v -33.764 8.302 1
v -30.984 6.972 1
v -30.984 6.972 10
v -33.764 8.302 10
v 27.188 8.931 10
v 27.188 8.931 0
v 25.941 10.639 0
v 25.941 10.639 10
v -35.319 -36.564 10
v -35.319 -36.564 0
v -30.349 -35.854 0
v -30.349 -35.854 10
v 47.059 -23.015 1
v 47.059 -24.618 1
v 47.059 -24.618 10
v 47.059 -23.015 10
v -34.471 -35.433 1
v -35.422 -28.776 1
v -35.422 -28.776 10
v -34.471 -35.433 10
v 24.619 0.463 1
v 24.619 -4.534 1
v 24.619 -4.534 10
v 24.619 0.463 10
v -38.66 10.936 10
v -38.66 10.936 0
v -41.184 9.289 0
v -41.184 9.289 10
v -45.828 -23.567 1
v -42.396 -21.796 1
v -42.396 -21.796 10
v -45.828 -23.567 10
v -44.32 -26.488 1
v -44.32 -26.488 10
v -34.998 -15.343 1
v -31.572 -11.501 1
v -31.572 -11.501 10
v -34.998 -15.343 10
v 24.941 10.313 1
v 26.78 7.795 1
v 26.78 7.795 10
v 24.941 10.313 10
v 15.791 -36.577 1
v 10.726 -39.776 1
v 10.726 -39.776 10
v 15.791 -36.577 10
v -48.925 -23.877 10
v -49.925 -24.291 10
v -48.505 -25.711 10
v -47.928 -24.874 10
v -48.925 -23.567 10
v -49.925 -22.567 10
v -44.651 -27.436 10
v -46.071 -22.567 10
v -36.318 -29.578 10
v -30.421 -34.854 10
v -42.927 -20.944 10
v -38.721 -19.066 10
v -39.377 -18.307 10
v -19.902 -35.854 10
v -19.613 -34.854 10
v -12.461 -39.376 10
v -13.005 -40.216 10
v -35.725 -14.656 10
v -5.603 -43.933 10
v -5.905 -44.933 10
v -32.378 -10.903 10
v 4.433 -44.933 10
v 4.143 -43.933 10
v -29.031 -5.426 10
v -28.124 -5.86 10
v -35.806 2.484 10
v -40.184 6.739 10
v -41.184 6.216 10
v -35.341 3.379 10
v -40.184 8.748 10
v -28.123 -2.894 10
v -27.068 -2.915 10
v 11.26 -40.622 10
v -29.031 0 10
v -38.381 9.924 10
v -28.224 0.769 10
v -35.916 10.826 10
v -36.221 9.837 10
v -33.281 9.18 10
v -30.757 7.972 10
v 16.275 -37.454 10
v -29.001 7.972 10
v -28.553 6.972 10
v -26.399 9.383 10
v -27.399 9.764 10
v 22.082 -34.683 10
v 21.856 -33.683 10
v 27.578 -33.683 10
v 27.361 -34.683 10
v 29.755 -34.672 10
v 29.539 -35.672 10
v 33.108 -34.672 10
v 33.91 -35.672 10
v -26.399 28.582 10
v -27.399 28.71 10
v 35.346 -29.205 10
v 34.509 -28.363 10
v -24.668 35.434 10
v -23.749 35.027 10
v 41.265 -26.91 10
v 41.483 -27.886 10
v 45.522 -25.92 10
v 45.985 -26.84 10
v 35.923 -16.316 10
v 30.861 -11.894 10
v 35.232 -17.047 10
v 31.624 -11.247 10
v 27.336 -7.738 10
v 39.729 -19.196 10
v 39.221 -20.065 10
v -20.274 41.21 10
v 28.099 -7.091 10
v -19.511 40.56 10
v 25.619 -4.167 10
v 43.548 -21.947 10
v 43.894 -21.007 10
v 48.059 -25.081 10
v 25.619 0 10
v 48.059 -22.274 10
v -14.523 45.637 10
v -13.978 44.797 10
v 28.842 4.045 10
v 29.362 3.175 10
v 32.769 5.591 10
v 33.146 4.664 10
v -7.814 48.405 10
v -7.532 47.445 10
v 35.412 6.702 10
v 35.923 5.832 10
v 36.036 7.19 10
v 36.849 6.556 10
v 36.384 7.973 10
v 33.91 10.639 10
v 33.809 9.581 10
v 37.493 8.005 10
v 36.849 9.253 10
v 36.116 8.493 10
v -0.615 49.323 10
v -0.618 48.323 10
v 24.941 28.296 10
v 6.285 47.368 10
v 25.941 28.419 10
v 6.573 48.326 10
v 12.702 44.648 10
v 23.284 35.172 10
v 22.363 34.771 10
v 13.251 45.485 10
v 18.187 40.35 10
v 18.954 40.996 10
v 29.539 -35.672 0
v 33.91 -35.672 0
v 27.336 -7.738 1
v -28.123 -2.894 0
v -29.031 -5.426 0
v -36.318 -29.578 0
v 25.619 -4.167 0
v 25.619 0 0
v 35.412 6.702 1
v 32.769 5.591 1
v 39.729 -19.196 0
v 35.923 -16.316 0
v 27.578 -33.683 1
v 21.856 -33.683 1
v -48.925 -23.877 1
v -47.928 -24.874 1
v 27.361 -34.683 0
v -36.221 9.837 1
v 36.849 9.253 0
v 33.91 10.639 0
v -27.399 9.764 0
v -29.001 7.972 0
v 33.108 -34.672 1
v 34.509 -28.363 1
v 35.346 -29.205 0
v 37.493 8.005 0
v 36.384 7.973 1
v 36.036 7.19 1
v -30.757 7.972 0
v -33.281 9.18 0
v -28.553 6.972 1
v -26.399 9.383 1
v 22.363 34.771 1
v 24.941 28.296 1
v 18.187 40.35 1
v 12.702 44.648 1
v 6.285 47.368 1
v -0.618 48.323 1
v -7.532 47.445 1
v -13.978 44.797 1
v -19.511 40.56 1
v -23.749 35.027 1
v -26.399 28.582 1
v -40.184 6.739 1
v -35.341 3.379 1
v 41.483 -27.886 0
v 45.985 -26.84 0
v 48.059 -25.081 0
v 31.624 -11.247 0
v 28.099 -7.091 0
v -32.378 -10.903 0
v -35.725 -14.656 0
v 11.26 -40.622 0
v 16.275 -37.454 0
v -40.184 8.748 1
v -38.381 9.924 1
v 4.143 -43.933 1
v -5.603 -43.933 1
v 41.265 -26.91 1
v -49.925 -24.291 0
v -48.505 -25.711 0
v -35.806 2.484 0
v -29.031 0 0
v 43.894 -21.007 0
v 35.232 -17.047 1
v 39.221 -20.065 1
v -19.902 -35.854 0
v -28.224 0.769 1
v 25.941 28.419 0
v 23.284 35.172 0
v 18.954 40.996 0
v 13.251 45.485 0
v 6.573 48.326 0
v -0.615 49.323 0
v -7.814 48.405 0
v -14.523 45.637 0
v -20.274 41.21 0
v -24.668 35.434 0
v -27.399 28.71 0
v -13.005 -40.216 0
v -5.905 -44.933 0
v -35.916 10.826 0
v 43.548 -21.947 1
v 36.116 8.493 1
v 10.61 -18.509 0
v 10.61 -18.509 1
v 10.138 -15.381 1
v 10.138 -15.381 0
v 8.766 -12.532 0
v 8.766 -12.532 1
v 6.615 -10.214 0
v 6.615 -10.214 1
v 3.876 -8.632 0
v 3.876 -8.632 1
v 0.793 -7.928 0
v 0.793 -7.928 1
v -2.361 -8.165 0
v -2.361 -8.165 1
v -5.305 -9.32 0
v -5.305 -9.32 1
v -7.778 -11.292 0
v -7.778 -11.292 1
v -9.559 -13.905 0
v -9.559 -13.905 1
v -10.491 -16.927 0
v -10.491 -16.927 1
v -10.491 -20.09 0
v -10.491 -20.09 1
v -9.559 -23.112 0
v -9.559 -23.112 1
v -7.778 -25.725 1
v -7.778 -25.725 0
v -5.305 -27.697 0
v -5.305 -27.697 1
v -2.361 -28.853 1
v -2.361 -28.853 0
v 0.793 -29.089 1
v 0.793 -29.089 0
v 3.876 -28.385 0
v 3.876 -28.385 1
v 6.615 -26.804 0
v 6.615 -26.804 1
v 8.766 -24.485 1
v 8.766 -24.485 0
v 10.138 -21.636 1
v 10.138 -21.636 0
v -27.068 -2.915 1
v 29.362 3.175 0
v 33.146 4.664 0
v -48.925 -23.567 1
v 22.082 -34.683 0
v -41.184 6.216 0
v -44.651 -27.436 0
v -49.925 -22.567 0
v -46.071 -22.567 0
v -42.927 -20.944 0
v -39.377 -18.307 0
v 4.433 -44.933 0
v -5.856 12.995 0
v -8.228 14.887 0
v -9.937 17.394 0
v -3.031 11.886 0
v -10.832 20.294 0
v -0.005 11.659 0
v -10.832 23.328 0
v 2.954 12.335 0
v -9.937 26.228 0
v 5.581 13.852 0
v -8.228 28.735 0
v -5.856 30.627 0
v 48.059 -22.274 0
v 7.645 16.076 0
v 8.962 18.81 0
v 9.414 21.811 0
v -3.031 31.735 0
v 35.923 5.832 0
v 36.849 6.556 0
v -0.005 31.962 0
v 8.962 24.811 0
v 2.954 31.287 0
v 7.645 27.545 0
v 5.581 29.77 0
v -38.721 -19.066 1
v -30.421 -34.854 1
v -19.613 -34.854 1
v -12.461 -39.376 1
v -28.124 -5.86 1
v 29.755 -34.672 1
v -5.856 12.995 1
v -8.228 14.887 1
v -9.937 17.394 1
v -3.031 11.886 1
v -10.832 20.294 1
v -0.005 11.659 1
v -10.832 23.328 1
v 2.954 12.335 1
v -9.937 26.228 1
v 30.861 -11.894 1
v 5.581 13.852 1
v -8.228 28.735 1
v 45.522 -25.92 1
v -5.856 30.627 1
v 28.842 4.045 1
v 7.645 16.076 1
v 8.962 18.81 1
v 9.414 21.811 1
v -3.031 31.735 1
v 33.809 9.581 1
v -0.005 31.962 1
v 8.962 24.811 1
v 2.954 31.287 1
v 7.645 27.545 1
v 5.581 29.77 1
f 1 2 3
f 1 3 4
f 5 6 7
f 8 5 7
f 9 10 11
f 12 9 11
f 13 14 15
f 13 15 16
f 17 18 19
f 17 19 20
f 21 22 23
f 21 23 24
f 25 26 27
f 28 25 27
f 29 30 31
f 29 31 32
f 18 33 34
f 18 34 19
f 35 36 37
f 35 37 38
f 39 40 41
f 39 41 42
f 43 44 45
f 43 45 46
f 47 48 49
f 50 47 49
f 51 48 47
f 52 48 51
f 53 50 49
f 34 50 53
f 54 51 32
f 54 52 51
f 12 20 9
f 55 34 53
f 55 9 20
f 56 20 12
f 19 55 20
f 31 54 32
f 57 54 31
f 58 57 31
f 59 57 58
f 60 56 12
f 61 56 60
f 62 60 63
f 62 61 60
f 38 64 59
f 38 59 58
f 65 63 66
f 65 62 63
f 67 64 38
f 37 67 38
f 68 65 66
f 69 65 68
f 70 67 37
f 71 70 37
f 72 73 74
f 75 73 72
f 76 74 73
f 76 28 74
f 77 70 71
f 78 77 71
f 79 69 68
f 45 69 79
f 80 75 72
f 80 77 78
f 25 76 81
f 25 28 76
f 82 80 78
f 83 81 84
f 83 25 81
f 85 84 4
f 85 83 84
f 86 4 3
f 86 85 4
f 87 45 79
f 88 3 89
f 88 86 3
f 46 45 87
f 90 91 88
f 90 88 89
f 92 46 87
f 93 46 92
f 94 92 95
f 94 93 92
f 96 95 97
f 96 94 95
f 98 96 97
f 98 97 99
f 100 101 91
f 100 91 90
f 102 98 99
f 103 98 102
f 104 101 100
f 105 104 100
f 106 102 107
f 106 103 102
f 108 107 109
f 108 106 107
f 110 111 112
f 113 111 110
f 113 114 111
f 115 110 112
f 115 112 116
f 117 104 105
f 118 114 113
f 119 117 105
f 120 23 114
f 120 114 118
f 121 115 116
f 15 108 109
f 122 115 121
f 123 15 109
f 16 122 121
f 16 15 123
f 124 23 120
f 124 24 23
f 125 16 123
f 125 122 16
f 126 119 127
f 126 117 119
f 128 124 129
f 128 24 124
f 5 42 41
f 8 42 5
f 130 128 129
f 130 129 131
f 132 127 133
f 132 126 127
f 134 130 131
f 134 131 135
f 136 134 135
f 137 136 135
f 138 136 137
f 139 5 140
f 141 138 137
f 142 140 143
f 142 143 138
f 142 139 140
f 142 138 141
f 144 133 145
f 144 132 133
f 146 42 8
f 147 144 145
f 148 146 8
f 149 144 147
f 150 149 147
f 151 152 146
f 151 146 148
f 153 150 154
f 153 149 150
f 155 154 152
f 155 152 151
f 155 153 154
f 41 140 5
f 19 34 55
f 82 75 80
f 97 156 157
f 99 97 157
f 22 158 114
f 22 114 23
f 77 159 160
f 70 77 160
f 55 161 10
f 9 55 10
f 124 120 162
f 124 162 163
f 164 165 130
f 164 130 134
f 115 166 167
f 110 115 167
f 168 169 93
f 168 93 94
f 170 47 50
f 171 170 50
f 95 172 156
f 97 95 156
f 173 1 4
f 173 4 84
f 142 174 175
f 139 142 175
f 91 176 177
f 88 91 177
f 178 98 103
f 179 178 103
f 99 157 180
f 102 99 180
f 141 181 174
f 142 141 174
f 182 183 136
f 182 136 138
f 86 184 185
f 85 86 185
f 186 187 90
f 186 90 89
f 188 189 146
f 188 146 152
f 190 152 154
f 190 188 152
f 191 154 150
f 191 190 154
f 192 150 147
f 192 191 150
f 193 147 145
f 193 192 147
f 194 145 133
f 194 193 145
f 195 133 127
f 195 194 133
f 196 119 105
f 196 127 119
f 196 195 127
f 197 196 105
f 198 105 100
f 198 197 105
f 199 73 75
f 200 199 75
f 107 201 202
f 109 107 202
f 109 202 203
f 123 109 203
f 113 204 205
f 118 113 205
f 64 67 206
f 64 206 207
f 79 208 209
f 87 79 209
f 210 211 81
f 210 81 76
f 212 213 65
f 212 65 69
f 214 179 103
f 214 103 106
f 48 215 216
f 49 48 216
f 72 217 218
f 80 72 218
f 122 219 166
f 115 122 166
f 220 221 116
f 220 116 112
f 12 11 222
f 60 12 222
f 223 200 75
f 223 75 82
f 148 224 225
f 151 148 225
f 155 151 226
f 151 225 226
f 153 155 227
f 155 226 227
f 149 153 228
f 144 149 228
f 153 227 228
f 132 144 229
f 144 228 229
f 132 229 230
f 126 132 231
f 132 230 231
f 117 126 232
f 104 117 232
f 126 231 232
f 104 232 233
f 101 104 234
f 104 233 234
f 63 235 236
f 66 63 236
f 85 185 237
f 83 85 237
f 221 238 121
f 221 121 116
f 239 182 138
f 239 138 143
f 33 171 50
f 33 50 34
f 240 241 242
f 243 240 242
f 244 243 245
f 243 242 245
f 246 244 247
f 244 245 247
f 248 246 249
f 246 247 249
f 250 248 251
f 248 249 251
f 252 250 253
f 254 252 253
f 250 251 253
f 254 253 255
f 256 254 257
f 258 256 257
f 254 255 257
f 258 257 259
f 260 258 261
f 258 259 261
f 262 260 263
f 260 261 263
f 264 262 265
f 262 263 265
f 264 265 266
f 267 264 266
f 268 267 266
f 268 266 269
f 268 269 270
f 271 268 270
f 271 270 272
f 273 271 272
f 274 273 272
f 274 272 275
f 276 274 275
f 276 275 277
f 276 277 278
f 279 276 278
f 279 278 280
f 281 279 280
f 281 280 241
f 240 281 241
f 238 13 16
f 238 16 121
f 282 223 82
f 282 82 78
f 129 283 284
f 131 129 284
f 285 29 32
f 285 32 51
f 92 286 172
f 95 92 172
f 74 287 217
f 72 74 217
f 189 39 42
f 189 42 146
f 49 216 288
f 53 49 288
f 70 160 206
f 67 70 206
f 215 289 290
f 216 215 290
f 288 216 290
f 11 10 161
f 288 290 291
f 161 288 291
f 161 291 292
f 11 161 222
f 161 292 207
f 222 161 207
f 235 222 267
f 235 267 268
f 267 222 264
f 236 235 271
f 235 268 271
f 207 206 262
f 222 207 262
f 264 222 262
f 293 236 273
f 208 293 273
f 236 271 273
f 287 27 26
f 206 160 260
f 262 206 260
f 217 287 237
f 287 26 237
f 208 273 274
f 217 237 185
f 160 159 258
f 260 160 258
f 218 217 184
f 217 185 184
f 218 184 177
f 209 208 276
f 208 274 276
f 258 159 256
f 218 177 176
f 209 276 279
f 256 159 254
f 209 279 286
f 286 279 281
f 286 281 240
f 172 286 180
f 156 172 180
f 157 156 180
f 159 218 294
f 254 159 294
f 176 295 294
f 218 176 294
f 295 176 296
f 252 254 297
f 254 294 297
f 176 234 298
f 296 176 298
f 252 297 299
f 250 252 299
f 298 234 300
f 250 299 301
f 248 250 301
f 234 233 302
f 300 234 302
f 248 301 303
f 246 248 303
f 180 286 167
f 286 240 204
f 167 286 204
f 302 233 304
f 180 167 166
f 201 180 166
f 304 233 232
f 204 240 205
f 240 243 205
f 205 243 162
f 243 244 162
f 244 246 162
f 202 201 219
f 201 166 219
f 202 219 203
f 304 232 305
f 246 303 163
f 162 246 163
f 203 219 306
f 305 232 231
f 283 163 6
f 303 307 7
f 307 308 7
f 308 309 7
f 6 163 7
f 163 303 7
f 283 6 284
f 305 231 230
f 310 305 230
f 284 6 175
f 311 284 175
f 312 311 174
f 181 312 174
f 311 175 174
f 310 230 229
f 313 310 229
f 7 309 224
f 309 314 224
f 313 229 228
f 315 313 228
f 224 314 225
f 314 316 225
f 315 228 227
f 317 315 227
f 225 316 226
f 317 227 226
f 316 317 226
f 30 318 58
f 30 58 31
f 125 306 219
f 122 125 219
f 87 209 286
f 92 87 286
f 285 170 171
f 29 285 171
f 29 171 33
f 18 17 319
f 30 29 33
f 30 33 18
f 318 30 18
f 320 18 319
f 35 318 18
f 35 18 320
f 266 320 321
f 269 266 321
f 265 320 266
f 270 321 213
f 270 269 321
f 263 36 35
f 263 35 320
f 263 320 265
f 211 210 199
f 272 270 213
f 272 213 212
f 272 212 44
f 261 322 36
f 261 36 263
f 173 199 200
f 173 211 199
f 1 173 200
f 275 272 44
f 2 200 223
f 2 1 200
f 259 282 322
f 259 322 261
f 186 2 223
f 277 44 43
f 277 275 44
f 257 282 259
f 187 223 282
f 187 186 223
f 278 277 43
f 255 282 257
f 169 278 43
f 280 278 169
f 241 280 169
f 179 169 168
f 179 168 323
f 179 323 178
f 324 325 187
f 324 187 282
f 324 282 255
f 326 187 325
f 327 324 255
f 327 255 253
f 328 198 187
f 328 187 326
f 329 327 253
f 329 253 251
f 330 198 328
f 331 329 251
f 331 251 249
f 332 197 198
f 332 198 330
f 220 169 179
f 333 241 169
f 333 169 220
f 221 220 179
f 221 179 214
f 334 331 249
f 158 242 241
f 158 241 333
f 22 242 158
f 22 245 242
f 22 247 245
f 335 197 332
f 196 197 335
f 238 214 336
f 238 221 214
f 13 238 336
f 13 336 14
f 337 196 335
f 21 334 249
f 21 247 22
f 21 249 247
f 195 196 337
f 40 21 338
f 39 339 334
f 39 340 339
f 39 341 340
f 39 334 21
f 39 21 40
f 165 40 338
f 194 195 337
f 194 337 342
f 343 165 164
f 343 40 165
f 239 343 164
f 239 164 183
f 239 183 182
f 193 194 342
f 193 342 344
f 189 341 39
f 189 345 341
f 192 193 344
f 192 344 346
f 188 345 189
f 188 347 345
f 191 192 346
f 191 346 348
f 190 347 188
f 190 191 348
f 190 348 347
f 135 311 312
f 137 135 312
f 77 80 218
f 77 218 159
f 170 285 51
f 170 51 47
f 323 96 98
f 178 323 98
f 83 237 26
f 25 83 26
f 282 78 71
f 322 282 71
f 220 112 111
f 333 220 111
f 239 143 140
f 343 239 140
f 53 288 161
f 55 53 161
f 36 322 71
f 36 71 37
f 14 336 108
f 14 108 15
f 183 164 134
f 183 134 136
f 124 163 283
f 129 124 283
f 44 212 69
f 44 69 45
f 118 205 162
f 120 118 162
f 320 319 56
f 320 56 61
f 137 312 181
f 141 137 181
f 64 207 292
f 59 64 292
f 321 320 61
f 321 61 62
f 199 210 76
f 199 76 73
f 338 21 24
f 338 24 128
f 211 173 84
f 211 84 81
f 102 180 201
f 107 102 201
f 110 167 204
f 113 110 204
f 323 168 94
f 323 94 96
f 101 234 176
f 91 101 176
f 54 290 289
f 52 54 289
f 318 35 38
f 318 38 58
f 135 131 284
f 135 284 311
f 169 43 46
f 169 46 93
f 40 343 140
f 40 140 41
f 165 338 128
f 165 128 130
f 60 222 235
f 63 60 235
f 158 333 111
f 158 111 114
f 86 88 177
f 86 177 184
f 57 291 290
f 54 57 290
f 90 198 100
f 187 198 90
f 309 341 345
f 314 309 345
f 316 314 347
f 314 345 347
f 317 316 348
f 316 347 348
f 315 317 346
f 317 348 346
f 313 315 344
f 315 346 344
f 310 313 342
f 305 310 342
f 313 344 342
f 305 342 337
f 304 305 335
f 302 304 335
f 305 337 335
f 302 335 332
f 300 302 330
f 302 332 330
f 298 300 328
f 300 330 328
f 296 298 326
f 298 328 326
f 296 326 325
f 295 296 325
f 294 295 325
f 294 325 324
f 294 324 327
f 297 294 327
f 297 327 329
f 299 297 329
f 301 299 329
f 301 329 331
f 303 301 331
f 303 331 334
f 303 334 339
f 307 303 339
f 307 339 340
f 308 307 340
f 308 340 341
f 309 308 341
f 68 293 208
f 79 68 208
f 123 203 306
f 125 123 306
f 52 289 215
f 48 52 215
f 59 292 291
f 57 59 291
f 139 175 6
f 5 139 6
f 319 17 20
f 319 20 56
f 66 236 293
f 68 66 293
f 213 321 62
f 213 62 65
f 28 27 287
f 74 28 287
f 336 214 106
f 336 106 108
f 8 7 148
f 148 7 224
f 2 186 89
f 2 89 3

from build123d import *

# Parameters (mm, degrees)
F1_DEPTH = 10
F2_T     = -1
F3_R     = 10.1798341208
F3_R_2   = 10.6098641694
F4_DEPTH = 1.001


with BuildPart() as f1:
    # F0 (on Top) → F1 (new body)
    with BuildSketch(Plane.XY):
        with BuildLine():
            Line((25.9413104504, 10.6388526037), (25.9413104504, 28.418853879))
            ThreePointArc((25.9413104504, 28.418853879), (-0.6152572854, 49.3227077034), (-27.3986887187, 28.7103280425))
            Line((-27.3986887187, 28.7103280425), (-27.3986887187, 9.7644263878))
            Line((-27.3986887187, 9.7644263878), (-29.000794515, 7.9723494127))
            Line((-29.000794515, 7.9723494127), (-30.7569466531, 7.9723494127))
            Line((-30.7569466531, 7.9723494127), (-33.2814157009, 9.1797038913))
            Line((-33.2814157009, 9.1797038913), (-35.9156429768, 10.8260978013))
            Line((-35.9156429768, 10.8260978013), (-38.659632206, 10.9358569607))
            Line((-38.659632206, 10.9358569607), (-41.1841012537, 9.289463982))
            Line((-41.1841012537, 9.289463982), (-41.1841012537, 6.216196809))
            Line((-41.1841012537, 6.216196809), (-35.8058847487, 2.4843721185))
            Line((-35.8058847487, 2.4843721185), (-29.0309265256, 0))
            Line((-29.0309265256, 0), (-28.1227175146, -2.8938457835))
            Line((-28.1227175146, -2.8938457835), (-29.0309265256, -5.4257945158))
            Line((-29.0309265256, -5.4257945158), (-32.3780551553, -10.902912356))
            Line((-32.3780551553, -10.902912356), (-35.7251800597, -14.6557530388))
            Line((-35.7251800597, -14.6557530388), (-39.3765941262, -18.3071661741))
            Line((-39.3765941262, -18.3071661741), (-42.9265759885, -20.944295451))
            Line((-42.9265759885, -20.944295451), (-46.0708513856, -22.5671455264))
            Line((-46.0708513856, -22.5671455264), (-49.9251186848, -22.5671455264))
            Line((-49.9251186848, -22.5671455264), (-49.9251186848, -24.2914240807))
            Line((-49.9251186848, -24.2914240807), (-48.5051237047, -25.7114171982))
            Line((-48.5051237047, -25.7114171982), (-44.6508564055, -27.4356938899))
            Line((-44.6508564055, -27.4356938899), (-36.3175208918, -29.5778558365))
            Line((-36.3175208918, -29.5778558365), (-35.3194698691, -36.5642234683))
            Line((-35.3194698691, -36.5642234683), (-30.3494930267, -35.8542278409))
            Line((-30.3494930267, -35.8542278409), (-19.9023969471, -35.8542278409))
            Line((-19.9023969471, -35.8542278409), (-13.0052855238, -40.2156375349))
            Line((-13.0052855238, -40.2156375349), (-5.9053180739, -44.9333089781))
            Line((-5.9053180739, -44.9333089781), (4.4327859365, -44.9333089781))
            Line((4.4327859365, -44.9333089781), (11.2596079707, -40.6216345727))
            Line((11.2596079707, -40.6216345727), (16.2748470902, -37.4541170895))
            Line((16.2748470902, -37.4541170895), (22.0819637179, -34.6825383604))
            Line((22.0819637179, -34.6825383604), (27.3611601442, -34.6825383604))
            Line((27.3611601442, -34.6825383604), (29.5388307422, -35.6723889709))
            Line((29.5388307422, -35.6723889709), (33.9104868472, -35.6723889709))
            Line((33.9104868472, -35.6723889709), (35.3459455073, -29.2053706944))
            Line((35.3459455073, -29.2053706944), (41.483014822, -27.8855711222))
            Line((41.483014822, -27.8855711222), (45.9846592715, -26.8396986936))
            Line((45.9846592715, -26.8396986936), (48.0585619807, -25.0806845725))
            Line((48.0585619807, -25.0806845725), (48.0585619807, -22.2740583122))
            Line((48.0585619807, -22.2740583122), (43.8938885927, -21.0065506399))
            Line((43.8938885927, -21.0065506399), (39.72921893, -19.1958248615))
            Line((39.72921893, -19.1958248615), (35.9230749309, -16.3158885314))
            Line((35.9230749309, -16.3158885314), (31.6239426274, -11.2471502964))
            Line((31.6239426274, -11.2471502964), (28.0989827636, -7.0911723973))
            Line((28.0989827636, -7.0911723973), (25.6186239421, -4.1667940095))
            Line((25.6186239421, -4.1667940095), (25.6186239421, 0))
            Line((25.6186239421, 0), (29.3620377779, 3.1750369817))
            Line((29.3620377779, 3.1750369817), (33.1457033753, 4.6643526293))
            Line((33.1457033753, 4.6643526293), (35.9230749309, 5.8316537179))
            Line((35.9230749309, 5.8316537179), (36.8488691747, 6.5561858937))
            Line((36.8488691747, 6.5561858937), (37.4928973615, 8.005249314))
            Line((37.4928973615, 8.005249314), (36.8488691747, 9.2530548573))
            Line((36.8488691747, 9.2530548573), (33.9104868472, 10.6388526037))
            Line((33.9104868472, 10.6388526037), (27.1884426475, 8.9310398325))
            Line((27.1884426475, 8.9310398325), (25.9413104504, 10.6388526037))
        make_face()
    extrude(amount=F1_DEPTH)

    # F2
    f2_openings = [f1.faces().sort_by_distance(p)[0] for p in [
        (-0.960702, -0.889332, 10),
    ]]
    offset(amount=F2_T, openings=f2_openings, kind=Kind.INTERSECTION)

    # F3 (on face) → F4 (cut, through all)
    with BuildSketch(Plane.XY.offset(1)):
        with Locations((-0.76559461, 21.8108601041)):
            Circle(F3_R)
        with Locations((0, -18.508689478)):
            Circle(F3_R_2)
    extrude(amount=-F4_DEPTH, mode=Mode.SUBTRACT)


solid = f1.part
